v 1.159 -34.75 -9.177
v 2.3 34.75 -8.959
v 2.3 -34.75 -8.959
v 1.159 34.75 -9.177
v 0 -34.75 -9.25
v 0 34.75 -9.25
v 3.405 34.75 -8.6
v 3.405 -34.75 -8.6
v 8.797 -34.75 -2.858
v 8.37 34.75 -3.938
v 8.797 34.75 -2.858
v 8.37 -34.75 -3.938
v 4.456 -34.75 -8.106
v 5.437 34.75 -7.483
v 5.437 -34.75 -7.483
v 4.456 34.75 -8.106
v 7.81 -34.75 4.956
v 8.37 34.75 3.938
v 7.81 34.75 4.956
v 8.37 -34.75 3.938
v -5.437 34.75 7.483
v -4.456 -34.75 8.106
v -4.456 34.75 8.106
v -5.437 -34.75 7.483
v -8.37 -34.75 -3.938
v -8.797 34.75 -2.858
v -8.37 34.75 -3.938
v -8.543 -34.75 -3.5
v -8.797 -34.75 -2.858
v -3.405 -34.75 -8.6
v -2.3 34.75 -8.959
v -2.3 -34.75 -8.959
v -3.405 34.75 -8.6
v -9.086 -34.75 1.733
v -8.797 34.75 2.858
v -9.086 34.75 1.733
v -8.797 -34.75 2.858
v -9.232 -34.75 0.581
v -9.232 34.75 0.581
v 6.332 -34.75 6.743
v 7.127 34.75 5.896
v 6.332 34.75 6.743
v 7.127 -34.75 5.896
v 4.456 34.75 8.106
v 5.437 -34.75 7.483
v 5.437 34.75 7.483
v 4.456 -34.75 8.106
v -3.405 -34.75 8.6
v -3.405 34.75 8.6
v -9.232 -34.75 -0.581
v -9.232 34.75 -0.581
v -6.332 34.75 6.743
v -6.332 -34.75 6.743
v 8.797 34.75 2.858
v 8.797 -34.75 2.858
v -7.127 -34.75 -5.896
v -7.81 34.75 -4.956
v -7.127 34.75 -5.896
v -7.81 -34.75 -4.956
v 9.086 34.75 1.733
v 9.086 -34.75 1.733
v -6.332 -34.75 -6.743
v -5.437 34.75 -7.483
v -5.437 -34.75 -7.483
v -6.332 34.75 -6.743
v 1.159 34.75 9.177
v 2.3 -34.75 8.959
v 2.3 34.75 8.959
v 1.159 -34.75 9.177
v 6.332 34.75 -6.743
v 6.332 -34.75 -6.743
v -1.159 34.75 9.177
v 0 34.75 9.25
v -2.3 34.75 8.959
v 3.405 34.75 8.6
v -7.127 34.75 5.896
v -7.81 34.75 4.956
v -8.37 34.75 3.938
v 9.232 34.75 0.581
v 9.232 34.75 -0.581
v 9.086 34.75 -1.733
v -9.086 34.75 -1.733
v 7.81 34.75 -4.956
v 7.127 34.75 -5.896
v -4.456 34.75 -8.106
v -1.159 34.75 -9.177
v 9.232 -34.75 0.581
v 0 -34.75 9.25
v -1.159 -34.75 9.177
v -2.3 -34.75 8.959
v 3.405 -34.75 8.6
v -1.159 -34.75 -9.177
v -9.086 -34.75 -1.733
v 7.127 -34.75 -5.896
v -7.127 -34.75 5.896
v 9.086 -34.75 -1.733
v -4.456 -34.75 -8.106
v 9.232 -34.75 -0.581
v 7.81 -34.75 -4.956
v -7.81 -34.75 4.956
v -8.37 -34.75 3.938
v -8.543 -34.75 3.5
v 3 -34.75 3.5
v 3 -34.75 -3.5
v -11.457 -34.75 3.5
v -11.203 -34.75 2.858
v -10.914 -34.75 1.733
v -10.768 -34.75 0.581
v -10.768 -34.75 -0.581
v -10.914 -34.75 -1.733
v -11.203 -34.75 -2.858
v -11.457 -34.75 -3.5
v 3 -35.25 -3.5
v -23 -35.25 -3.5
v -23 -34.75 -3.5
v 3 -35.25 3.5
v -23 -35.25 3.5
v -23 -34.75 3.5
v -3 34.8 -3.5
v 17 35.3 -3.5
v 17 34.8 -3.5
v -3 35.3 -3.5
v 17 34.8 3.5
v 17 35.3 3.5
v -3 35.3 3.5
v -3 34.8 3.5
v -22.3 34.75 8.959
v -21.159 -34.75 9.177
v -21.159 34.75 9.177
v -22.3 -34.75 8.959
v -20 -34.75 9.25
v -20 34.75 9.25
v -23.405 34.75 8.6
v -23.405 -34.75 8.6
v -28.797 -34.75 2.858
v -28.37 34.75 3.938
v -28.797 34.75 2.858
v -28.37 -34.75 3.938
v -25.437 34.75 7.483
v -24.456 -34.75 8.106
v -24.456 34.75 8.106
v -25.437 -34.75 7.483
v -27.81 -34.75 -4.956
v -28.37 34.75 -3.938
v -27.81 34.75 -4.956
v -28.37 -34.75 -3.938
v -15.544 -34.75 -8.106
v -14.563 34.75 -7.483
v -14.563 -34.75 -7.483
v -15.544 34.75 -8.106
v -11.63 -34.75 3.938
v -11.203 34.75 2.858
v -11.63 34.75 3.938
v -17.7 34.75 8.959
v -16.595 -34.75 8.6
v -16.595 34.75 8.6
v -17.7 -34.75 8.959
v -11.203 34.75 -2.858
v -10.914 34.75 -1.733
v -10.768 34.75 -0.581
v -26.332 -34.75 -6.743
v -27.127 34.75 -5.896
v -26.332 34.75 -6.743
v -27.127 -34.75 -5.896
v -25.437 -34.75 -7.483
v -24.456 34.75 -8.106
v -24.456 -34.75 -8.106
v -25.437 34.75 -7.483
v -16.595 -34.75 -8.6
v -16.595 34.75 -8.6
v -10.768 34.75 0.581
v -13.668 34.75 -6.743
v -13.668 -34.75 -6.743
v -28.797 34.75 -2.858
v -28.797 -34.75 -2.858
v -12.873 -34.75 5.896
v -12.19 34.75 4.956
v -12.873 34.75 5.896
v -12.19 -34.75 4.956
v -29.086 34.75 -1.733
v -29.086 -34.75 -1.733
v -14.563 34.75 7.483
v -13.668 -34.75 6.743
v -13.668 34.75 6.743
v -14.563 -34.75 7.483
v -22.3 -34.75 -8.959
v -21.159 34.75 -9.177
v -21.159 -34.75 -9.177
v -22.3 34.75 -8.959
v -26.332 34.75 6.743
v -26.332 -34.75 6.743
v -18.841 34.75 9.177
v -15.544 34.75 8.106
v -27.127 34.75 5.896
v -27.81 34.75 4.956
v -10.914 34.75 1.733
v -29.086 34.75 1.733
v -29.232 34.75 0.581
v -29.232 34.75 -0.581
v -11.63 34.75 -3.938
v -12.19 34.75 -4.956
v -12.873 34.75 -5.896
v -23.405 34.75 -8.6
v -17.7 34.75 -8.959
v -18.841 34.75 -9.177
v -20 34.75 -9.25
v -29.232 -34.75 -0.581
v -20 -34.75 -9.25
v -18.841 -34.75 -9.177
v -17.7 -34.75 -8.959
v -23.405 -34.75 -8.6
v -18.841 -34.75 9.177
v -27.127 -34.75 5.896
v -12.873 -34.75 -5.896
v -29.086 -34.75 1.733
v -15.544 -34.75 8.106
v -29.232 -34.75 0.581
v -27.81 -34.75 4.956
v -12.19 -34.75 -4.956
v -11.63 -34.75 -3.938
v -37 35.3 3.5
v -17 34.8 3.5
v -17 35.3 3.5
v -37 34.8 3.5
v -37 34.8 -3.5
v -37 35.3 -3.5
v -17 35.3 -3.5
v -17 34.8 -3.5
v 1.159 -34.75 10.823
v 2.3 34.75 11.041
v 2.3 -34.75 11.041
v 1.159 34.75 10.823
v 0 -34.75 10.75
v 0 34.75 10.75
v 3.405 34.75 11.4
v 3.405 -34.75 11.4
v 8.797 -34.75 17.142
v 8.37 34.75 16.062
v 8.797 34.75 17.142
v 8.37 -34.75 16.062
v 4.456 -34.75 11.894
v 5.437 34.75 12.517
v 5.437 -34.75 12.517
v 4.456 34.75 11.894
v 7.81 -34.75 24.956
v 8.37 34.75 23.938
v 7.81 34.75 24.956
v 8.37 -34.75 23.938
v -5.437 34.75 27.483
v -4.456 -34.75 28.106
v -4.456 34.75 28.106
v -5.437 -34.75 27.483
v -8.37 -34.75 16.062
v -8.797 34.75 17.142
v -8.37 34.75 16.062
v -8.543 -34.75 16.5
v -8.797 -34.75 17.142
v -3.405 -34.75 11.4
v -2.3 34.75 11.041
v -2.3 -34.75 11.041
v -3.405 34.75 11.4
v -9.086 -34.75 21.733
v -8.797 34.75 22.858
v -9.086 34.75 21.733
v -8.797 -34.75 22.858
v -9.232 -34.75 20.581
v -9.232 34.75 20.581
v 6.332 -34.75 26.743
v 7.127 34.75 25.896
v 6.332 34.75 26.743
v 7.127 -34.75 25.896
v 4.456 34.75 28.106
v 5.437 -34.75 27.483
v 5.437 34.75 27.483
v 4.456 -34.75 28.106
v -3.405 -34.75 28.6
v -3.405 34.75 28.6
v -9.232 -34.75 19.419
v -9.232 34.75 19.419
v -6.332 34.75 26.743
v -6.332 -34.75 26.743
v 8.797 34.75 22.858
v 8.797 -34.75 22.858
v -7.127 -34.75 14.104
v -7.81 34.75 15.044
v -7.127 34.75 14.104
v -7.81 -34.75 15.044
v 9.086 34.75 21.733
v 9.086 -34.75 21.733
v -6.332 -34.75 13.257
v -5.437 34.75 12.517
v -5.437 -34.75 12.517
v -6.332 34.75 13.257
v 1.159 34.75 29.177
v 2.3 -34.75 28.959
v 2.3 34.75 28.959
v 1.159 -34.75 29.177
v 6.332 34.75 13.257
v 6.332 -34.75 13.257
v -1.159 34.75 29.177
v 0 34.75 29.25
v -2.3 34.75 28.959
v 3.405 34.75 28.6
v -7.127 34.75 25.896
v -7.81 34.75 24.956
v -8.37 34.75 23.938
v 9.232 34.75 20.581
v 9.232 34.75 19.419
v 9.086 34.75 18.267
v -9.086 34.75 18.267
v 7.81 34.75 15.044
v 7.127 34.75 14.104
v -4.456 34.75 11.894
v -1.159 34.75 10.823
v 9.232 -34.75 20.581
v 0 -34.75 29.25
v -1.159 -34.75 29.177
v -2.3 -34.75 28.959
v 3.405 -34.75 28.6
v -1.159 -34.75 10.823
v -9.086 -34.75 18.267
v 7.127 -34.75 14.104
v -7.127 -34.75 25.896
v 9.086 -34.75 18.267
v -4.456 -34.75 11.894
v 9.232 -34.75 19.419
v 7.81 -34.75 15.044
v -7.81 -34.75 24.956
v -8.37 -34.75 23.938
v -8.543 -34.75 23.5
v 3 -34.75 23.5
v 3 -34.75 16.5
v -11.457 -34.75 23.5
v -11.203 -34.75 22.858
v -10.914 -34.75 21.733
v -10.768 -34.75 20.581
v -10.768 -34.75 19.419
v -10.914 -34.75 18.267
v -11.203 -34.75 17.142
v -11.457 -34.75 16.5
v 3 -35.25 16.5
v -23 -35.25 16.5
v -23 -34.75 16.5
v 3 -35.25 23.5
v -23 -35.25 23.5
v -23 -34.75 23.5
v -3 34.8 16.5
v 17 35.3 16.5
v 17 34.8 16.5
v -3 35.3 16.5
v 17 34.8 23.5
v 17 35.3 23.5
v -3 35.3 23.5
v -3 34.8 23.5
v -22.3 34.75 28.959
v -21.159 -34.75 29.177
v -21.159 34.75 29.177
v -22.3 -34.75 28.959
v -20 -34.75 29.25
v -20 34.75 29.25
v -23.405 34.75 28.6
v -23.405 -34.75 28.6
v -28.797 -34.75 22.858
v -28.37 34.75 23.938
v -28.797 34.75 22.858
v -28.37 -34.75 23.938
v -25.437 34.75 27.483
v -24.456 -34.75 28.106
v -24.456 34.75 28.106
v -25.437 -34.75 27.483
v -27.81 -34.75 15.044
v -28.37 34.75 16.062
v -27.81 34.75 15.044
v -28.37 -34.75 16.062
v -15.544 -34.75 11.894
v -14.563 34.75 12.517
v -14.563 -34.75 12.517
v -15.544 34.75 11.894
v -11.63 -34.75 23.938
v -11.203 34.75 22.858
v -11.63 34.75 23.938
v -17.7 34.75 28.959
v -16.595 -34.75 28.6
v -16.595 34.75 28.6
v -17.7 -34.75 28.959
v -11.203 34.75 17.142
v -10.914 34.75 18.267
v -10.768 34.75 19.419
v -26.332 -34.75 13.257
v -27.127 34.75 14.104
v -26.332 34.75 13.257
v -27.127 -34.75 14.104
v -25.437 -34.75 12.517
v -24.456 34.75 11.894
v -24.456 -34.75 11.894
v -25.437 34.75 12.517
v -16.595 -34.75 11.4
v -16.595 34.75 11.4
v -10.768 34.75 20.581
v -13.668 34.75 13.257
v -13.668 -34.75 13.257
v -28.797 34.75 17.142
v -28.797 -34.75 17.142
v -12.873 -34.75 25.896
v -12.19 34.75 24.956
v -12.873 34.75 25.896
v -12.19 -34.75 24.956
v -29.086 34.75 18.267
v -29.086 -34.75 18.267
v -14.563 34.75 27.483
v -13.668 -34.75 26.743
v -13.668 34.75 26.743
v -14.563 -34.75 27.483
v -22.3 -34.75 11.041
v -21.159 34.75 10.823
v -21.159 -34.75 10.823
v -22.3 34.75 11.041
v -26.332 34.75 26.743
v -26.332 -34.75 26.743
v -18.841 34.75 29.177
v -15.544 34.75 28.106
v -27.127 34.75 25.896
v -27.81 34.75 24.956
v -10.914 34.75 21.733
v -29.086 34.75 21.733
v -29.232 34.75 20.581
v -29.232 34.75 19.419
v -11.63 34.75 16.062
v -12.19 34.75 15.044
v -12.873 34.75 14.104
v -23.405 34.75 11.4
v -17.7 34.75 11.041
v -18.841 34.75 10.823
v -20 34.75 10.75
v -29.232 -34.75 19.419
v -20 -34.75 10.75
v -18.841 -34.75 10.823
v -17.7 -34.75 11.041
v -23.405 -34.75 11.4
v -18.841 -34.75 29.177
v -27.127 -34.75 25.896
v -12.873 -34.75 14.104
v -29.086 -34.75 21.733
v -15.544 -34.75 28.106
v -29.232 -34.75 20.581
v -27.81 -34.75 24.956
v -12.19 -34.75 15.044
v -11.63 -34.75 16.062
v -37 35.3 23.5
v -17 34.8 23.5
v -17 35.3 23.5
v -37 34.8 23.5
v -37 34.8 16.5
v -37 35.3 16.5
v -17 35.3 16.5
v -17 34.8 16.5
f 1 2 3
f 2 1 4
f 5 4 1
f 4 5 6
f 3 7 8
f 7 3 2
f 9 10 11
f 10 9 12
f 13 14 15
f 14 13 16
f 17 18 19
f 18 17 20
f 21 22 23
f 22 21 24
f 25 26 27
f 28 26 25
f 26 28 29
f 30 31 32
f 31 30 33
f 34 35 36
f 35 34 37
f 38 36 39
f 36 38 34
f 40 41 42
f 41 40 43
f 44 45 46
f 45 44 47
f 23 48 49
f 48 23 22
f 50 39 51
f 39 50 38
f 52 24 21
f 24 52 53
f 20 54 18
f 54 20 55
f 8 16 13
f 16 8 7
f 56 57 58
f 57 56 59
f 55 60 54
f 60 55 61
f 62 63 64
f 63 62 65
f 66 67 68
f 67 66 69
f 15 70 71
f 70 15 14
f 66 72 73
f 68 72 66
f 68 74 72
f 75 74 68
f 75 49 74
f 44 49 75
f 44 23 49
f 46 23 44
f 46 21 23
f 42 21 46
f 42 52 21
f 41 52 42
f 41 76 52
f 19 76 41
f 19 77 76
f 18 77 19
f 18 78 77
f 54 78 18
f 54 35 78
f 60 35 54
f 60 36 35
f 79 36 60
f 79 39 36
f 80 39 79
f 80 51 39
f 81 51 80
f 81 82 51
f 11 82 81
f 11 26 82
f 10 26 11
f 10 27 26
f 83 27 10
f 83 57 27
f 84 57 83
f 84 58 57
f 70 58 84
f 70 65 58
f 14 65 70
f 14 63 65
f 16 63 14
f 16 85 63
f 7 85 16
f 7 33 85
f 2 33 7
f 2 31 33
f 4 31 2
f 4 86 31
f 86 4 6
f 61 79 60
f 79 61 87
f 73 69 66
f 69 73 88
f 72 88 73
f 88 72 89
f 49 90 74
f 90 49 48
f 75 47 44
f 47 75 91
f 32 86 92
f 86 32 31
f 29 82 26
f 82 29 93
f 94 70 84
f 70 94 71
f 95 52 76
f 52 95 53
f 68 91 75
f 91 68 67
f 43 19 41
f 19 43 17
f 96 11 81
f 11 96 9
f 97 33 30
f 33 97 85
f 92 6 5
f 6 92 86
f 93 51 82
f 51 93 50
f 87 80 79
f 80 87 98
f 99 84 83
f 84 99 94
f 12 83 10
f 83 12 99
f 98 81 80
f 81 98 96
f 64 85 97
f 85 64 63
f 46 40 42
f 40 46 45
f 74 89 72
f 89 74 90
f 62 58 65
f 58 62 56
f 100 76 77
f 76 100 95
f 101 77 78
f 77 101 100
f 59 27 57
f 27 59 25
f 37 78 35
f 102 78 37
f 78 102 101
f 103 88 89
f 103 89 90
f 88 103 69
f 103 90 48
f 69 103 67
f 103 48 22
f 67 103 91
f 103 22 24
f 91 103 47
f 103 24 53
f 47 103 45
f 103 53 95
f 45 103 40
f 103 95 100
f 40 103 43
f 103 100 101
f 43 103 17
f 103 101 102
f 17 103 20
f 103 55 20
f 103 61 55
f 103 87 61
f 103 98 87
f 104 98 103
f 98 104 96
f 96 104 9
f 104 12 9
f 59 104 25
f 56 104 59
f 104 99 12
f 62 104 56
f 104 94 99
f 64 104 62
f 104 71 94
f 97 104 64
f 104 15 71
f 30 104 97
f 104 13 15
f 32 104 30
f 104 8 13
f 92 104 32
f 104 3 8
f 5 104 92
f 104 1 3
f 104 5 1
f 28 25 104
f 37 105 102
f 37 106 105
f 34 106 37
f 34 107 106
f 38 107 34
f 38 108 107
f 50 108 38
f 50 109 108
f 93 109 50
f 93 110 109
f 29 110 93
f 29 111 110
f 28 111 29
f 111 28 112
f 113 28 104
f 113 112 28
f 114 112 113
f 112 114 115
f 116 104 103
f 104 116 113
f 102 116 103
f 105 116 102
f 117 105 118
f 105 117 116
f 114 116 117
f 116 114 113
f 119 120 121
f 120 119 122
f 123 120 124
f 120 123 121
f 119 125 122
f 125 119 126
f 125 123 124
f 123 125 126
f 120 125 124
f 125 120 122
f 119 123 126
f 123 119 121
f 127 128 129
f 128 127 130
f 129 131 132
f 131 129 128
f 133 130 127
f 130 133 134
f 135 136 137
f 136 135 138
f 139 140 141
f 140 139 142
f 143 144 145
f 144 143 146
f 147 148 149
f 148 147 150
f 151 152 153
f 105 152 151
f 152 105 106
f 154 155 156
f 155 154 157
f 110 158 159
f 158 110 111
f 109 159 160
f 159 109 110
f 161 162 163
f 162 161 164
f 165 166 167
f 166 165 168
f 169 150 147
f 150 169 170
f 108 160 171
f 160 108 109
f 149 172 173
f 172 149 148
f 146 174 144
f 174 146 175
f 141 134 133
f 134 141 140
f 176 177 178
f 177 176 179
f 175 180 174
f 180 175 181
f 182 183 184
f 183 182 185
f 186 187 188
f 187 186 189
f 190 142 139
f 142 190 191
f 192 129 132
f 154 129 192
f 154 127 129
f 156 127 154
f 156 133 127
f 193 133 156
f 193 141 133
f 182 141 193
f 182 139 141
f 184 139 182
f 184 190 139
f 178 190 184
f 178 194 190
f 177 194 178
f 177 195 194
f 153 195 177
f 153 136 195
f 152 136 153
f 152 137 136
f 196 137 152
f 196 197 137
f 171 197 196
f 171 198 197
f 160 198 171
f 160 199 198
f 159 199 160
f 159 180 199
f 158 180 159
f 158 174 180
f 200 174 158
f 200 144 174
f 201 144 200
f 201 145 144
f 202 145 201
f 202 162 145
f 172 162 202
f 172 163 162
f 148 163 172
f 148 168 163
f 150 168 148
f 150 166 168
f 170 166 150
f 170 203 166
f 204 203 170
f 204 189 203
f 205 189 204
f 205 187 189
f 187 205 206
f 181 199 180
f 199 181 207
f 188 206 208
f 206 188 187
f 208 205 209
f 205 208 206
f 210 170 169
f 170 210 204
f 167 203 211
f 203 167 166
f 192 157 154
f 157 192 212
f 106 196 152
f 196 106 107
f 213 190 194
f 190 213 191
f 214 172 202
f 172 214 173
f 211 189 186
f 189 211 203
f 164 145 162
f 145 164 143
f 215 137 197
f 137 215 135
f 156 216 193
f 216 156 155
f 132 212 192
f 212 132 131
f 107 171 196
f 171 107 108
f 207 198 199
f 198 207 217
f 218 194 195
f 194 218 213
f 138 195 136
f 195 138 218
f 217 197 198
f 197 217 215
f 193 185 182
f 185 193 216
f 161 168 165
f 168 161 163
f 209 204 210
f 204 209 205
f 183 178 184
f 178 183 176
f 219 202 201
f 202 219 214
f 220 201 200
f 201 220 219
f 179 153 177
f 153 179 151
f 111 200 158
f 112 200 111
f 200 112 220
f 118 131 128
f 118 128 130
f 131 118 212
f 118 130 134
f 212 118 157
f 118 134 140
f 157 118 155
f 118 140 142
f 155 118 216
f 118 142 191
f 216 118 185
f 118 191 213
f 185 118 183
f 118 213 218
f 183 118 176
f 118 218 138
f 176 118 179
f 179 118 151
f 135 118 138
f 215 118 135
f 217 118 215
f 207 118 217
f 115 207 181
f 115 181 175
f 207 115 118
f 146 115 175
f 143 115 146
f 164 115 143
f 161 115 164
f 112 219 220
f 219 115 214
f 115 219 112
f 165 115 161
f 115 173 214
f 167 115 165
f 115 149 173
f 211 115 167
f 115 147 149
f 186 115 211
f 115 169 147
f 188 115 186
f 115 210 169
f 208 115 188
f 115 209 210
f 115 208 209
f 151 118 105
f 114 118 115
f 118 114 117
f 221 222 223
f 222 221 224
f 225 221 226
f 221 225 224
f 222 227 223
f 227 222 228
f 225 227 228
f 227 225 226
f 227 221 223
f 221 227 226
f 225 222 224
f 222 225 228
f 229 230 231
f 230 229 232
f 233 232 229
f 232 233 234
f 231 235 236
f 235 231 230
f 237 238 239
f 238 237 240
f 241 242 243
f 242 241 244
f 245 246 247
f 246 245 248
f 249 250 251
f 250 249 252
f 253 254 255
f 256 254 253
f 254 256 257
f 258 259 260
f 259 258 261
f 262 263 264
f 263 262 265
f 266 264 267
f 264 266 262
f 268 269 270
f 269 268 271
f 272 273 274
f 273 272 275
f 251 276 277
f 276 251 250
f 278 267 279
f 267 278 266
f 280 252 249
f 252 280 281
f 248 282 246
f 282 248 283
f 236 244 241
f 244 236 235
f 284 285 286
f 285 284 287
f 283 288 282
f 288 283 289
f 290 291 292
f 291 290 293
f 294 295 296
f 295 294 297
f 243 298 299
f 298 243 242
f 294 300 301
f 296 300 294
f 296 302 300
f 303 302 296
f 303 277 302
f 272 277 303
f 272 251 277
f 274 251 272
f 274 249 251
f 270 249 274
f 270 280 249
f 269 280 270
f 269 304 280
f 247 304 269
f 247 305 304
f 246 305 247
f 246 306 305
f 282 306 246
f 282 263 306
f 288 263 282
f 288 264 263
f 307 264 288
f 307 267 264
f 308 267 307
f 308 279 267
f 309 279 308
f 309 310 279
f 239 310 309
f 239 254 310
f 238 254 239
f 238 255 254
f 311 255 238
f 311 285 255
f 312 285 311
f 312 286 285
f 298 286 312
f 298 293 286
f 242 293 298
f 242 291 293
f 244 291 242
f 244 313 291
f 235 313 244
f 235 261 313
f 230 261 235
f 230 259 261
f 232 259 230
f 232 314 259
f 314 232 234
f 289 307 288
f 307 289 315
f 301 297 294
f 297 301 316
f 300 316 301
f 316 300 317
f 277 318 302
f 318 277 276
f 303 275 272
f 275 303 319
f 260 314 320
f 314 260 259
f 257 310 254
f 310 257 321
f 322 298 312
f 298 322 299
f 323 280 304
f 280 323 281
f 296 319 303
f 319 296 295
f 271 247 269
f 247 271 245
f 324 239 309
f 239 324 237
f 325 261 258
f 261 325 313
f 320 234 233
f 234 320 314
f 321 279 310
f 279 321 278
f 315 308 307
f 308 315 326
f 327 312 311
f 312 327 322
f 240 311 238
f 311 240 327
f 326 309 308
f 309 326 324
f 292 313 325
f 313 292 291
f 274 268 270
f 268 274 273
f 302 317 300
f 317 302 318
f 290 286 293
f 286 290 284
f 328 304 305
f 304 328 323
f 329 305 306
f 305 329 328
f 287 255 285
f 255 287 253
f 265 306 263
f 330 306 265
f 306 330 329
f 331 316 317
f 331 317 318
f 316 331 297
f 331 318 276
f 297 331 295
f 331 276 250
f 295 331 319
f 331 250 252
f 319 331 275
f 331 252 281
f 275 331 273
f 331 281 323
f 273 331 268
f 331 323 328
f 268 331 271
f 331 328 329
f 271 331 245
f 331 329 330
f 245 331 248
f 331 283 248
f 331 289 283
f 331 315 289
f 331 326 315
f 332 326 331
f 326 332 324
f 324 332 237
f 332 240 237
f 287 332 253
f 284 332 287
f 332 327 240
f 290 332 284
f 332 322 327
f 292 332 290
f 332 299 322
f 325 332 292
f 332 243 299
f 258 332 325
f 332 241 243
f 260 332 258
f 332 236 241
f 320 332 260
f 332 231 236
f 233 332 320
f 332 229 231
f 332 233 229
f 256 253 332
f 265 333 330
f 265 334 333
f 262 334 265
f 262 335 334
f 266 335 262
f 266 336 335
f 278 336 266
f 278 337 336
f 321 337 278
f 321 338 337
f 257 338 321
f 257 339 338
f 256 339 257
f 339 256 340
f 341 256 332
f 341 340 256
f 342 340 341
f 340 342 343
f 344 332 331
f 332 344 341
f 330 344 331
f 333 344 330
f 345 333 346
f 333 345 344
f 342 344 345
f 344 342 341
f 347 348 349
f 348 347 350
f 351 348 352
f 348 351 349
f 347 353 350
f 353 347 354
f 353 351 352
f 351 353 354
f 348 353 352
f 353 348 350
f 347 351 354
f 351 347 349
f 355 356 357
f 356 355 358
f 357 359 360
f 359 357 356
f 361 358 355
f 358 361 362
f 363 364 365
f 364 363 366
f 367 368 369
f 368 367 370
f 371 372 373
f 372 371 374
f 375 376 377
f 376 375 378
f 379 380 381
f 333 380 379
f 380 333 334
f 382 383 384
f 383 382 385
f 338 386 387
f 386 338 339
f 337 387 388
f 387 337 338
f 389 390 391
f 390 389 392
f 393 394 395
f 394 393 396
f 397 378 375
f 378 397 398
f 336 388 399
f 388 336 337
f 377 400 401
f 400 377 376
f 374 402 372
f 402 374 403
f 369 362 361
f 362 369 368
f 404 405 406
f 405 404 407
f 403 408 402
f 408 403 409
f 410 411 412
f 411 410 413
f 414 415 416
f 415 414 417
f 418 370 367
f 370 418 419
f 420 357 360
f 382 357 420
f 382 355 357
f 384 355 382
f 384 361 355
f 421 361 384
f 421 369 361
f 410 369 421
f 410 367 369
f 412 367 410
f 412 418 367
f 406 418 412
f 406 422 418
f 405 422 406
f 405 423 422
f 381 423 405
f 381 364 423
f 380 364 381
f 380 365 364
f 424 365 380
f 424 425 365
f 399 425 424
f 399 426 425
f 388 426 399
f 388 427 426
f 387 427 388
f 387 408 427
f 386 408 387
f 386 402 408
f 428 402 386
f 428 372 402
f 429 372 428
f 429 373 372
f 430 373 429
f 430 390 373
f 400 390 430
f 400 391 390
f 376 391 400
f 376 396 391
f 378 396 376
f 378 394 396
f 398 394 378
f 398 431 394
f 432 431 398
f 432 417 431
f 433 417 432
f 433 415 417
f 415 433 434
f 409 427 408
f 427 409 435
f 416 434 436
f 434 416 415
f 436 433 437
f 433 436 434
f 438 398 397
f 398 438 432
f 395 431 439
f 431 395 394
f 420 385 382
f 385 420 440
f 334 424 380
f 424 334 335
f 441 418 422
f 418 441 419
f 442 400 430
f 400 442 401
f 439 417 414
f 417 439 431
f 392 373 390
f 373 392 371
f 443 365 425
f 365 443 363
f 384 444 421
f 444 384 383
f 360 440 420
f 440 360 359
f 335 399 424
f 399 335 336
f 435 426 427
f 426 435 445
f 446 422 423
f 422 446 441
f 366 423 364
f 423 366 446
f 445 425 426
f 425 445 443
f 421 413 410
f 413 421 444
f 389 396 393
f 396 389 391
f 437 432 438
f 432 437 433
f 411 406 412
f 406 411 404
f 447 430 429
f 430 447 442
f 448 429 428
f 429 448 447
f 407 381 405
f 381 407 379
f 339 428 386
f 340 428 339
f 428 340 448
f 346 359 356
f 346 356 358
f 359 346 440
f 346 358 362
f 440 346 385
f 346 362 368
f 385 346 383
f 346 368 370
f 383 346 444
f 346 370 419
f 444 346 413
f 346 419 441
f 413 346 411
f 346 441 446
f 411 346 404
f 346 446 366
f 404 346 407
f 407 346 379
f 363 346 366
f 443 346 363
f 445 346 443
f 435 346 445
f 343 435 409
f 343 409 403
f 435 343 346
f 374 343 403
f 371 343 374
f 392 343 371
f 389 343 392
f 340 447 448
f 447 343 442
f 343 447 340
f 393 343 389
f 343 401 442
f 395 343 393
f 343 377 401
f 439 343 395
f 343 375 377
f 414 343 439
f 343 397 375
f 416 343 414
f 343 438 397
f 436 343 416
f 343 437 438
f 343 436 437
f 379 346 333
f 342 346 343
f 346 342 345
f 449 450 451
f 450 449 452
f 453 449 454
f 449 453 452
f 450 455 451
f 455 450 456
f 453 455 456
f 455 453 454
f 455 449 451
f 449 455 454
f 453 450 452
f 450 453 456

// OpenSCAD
$fn=50;

module battery() {
    
    color("pink") rotate([90,0,0]) cylinder(h=69.5, d=18.5, center=true);
    color("lightgray") translate([-7/2,-35.25,-17]) cube([7, 0.5, 20]);
    color("lightgray") translate([-7/2, 34.8, -3]) cube([7, 0.5, 20]);
}


translate([0,0,0]) rotate([0,90,0]) battery();
translate([-20, 0, 0]) rotate([0,-90,0]) battery();

translate([0,0,20]) rotate([0,90,0]) battery();
translate([-20, 0, 20]) rotate([0,-90,0]) battery();
